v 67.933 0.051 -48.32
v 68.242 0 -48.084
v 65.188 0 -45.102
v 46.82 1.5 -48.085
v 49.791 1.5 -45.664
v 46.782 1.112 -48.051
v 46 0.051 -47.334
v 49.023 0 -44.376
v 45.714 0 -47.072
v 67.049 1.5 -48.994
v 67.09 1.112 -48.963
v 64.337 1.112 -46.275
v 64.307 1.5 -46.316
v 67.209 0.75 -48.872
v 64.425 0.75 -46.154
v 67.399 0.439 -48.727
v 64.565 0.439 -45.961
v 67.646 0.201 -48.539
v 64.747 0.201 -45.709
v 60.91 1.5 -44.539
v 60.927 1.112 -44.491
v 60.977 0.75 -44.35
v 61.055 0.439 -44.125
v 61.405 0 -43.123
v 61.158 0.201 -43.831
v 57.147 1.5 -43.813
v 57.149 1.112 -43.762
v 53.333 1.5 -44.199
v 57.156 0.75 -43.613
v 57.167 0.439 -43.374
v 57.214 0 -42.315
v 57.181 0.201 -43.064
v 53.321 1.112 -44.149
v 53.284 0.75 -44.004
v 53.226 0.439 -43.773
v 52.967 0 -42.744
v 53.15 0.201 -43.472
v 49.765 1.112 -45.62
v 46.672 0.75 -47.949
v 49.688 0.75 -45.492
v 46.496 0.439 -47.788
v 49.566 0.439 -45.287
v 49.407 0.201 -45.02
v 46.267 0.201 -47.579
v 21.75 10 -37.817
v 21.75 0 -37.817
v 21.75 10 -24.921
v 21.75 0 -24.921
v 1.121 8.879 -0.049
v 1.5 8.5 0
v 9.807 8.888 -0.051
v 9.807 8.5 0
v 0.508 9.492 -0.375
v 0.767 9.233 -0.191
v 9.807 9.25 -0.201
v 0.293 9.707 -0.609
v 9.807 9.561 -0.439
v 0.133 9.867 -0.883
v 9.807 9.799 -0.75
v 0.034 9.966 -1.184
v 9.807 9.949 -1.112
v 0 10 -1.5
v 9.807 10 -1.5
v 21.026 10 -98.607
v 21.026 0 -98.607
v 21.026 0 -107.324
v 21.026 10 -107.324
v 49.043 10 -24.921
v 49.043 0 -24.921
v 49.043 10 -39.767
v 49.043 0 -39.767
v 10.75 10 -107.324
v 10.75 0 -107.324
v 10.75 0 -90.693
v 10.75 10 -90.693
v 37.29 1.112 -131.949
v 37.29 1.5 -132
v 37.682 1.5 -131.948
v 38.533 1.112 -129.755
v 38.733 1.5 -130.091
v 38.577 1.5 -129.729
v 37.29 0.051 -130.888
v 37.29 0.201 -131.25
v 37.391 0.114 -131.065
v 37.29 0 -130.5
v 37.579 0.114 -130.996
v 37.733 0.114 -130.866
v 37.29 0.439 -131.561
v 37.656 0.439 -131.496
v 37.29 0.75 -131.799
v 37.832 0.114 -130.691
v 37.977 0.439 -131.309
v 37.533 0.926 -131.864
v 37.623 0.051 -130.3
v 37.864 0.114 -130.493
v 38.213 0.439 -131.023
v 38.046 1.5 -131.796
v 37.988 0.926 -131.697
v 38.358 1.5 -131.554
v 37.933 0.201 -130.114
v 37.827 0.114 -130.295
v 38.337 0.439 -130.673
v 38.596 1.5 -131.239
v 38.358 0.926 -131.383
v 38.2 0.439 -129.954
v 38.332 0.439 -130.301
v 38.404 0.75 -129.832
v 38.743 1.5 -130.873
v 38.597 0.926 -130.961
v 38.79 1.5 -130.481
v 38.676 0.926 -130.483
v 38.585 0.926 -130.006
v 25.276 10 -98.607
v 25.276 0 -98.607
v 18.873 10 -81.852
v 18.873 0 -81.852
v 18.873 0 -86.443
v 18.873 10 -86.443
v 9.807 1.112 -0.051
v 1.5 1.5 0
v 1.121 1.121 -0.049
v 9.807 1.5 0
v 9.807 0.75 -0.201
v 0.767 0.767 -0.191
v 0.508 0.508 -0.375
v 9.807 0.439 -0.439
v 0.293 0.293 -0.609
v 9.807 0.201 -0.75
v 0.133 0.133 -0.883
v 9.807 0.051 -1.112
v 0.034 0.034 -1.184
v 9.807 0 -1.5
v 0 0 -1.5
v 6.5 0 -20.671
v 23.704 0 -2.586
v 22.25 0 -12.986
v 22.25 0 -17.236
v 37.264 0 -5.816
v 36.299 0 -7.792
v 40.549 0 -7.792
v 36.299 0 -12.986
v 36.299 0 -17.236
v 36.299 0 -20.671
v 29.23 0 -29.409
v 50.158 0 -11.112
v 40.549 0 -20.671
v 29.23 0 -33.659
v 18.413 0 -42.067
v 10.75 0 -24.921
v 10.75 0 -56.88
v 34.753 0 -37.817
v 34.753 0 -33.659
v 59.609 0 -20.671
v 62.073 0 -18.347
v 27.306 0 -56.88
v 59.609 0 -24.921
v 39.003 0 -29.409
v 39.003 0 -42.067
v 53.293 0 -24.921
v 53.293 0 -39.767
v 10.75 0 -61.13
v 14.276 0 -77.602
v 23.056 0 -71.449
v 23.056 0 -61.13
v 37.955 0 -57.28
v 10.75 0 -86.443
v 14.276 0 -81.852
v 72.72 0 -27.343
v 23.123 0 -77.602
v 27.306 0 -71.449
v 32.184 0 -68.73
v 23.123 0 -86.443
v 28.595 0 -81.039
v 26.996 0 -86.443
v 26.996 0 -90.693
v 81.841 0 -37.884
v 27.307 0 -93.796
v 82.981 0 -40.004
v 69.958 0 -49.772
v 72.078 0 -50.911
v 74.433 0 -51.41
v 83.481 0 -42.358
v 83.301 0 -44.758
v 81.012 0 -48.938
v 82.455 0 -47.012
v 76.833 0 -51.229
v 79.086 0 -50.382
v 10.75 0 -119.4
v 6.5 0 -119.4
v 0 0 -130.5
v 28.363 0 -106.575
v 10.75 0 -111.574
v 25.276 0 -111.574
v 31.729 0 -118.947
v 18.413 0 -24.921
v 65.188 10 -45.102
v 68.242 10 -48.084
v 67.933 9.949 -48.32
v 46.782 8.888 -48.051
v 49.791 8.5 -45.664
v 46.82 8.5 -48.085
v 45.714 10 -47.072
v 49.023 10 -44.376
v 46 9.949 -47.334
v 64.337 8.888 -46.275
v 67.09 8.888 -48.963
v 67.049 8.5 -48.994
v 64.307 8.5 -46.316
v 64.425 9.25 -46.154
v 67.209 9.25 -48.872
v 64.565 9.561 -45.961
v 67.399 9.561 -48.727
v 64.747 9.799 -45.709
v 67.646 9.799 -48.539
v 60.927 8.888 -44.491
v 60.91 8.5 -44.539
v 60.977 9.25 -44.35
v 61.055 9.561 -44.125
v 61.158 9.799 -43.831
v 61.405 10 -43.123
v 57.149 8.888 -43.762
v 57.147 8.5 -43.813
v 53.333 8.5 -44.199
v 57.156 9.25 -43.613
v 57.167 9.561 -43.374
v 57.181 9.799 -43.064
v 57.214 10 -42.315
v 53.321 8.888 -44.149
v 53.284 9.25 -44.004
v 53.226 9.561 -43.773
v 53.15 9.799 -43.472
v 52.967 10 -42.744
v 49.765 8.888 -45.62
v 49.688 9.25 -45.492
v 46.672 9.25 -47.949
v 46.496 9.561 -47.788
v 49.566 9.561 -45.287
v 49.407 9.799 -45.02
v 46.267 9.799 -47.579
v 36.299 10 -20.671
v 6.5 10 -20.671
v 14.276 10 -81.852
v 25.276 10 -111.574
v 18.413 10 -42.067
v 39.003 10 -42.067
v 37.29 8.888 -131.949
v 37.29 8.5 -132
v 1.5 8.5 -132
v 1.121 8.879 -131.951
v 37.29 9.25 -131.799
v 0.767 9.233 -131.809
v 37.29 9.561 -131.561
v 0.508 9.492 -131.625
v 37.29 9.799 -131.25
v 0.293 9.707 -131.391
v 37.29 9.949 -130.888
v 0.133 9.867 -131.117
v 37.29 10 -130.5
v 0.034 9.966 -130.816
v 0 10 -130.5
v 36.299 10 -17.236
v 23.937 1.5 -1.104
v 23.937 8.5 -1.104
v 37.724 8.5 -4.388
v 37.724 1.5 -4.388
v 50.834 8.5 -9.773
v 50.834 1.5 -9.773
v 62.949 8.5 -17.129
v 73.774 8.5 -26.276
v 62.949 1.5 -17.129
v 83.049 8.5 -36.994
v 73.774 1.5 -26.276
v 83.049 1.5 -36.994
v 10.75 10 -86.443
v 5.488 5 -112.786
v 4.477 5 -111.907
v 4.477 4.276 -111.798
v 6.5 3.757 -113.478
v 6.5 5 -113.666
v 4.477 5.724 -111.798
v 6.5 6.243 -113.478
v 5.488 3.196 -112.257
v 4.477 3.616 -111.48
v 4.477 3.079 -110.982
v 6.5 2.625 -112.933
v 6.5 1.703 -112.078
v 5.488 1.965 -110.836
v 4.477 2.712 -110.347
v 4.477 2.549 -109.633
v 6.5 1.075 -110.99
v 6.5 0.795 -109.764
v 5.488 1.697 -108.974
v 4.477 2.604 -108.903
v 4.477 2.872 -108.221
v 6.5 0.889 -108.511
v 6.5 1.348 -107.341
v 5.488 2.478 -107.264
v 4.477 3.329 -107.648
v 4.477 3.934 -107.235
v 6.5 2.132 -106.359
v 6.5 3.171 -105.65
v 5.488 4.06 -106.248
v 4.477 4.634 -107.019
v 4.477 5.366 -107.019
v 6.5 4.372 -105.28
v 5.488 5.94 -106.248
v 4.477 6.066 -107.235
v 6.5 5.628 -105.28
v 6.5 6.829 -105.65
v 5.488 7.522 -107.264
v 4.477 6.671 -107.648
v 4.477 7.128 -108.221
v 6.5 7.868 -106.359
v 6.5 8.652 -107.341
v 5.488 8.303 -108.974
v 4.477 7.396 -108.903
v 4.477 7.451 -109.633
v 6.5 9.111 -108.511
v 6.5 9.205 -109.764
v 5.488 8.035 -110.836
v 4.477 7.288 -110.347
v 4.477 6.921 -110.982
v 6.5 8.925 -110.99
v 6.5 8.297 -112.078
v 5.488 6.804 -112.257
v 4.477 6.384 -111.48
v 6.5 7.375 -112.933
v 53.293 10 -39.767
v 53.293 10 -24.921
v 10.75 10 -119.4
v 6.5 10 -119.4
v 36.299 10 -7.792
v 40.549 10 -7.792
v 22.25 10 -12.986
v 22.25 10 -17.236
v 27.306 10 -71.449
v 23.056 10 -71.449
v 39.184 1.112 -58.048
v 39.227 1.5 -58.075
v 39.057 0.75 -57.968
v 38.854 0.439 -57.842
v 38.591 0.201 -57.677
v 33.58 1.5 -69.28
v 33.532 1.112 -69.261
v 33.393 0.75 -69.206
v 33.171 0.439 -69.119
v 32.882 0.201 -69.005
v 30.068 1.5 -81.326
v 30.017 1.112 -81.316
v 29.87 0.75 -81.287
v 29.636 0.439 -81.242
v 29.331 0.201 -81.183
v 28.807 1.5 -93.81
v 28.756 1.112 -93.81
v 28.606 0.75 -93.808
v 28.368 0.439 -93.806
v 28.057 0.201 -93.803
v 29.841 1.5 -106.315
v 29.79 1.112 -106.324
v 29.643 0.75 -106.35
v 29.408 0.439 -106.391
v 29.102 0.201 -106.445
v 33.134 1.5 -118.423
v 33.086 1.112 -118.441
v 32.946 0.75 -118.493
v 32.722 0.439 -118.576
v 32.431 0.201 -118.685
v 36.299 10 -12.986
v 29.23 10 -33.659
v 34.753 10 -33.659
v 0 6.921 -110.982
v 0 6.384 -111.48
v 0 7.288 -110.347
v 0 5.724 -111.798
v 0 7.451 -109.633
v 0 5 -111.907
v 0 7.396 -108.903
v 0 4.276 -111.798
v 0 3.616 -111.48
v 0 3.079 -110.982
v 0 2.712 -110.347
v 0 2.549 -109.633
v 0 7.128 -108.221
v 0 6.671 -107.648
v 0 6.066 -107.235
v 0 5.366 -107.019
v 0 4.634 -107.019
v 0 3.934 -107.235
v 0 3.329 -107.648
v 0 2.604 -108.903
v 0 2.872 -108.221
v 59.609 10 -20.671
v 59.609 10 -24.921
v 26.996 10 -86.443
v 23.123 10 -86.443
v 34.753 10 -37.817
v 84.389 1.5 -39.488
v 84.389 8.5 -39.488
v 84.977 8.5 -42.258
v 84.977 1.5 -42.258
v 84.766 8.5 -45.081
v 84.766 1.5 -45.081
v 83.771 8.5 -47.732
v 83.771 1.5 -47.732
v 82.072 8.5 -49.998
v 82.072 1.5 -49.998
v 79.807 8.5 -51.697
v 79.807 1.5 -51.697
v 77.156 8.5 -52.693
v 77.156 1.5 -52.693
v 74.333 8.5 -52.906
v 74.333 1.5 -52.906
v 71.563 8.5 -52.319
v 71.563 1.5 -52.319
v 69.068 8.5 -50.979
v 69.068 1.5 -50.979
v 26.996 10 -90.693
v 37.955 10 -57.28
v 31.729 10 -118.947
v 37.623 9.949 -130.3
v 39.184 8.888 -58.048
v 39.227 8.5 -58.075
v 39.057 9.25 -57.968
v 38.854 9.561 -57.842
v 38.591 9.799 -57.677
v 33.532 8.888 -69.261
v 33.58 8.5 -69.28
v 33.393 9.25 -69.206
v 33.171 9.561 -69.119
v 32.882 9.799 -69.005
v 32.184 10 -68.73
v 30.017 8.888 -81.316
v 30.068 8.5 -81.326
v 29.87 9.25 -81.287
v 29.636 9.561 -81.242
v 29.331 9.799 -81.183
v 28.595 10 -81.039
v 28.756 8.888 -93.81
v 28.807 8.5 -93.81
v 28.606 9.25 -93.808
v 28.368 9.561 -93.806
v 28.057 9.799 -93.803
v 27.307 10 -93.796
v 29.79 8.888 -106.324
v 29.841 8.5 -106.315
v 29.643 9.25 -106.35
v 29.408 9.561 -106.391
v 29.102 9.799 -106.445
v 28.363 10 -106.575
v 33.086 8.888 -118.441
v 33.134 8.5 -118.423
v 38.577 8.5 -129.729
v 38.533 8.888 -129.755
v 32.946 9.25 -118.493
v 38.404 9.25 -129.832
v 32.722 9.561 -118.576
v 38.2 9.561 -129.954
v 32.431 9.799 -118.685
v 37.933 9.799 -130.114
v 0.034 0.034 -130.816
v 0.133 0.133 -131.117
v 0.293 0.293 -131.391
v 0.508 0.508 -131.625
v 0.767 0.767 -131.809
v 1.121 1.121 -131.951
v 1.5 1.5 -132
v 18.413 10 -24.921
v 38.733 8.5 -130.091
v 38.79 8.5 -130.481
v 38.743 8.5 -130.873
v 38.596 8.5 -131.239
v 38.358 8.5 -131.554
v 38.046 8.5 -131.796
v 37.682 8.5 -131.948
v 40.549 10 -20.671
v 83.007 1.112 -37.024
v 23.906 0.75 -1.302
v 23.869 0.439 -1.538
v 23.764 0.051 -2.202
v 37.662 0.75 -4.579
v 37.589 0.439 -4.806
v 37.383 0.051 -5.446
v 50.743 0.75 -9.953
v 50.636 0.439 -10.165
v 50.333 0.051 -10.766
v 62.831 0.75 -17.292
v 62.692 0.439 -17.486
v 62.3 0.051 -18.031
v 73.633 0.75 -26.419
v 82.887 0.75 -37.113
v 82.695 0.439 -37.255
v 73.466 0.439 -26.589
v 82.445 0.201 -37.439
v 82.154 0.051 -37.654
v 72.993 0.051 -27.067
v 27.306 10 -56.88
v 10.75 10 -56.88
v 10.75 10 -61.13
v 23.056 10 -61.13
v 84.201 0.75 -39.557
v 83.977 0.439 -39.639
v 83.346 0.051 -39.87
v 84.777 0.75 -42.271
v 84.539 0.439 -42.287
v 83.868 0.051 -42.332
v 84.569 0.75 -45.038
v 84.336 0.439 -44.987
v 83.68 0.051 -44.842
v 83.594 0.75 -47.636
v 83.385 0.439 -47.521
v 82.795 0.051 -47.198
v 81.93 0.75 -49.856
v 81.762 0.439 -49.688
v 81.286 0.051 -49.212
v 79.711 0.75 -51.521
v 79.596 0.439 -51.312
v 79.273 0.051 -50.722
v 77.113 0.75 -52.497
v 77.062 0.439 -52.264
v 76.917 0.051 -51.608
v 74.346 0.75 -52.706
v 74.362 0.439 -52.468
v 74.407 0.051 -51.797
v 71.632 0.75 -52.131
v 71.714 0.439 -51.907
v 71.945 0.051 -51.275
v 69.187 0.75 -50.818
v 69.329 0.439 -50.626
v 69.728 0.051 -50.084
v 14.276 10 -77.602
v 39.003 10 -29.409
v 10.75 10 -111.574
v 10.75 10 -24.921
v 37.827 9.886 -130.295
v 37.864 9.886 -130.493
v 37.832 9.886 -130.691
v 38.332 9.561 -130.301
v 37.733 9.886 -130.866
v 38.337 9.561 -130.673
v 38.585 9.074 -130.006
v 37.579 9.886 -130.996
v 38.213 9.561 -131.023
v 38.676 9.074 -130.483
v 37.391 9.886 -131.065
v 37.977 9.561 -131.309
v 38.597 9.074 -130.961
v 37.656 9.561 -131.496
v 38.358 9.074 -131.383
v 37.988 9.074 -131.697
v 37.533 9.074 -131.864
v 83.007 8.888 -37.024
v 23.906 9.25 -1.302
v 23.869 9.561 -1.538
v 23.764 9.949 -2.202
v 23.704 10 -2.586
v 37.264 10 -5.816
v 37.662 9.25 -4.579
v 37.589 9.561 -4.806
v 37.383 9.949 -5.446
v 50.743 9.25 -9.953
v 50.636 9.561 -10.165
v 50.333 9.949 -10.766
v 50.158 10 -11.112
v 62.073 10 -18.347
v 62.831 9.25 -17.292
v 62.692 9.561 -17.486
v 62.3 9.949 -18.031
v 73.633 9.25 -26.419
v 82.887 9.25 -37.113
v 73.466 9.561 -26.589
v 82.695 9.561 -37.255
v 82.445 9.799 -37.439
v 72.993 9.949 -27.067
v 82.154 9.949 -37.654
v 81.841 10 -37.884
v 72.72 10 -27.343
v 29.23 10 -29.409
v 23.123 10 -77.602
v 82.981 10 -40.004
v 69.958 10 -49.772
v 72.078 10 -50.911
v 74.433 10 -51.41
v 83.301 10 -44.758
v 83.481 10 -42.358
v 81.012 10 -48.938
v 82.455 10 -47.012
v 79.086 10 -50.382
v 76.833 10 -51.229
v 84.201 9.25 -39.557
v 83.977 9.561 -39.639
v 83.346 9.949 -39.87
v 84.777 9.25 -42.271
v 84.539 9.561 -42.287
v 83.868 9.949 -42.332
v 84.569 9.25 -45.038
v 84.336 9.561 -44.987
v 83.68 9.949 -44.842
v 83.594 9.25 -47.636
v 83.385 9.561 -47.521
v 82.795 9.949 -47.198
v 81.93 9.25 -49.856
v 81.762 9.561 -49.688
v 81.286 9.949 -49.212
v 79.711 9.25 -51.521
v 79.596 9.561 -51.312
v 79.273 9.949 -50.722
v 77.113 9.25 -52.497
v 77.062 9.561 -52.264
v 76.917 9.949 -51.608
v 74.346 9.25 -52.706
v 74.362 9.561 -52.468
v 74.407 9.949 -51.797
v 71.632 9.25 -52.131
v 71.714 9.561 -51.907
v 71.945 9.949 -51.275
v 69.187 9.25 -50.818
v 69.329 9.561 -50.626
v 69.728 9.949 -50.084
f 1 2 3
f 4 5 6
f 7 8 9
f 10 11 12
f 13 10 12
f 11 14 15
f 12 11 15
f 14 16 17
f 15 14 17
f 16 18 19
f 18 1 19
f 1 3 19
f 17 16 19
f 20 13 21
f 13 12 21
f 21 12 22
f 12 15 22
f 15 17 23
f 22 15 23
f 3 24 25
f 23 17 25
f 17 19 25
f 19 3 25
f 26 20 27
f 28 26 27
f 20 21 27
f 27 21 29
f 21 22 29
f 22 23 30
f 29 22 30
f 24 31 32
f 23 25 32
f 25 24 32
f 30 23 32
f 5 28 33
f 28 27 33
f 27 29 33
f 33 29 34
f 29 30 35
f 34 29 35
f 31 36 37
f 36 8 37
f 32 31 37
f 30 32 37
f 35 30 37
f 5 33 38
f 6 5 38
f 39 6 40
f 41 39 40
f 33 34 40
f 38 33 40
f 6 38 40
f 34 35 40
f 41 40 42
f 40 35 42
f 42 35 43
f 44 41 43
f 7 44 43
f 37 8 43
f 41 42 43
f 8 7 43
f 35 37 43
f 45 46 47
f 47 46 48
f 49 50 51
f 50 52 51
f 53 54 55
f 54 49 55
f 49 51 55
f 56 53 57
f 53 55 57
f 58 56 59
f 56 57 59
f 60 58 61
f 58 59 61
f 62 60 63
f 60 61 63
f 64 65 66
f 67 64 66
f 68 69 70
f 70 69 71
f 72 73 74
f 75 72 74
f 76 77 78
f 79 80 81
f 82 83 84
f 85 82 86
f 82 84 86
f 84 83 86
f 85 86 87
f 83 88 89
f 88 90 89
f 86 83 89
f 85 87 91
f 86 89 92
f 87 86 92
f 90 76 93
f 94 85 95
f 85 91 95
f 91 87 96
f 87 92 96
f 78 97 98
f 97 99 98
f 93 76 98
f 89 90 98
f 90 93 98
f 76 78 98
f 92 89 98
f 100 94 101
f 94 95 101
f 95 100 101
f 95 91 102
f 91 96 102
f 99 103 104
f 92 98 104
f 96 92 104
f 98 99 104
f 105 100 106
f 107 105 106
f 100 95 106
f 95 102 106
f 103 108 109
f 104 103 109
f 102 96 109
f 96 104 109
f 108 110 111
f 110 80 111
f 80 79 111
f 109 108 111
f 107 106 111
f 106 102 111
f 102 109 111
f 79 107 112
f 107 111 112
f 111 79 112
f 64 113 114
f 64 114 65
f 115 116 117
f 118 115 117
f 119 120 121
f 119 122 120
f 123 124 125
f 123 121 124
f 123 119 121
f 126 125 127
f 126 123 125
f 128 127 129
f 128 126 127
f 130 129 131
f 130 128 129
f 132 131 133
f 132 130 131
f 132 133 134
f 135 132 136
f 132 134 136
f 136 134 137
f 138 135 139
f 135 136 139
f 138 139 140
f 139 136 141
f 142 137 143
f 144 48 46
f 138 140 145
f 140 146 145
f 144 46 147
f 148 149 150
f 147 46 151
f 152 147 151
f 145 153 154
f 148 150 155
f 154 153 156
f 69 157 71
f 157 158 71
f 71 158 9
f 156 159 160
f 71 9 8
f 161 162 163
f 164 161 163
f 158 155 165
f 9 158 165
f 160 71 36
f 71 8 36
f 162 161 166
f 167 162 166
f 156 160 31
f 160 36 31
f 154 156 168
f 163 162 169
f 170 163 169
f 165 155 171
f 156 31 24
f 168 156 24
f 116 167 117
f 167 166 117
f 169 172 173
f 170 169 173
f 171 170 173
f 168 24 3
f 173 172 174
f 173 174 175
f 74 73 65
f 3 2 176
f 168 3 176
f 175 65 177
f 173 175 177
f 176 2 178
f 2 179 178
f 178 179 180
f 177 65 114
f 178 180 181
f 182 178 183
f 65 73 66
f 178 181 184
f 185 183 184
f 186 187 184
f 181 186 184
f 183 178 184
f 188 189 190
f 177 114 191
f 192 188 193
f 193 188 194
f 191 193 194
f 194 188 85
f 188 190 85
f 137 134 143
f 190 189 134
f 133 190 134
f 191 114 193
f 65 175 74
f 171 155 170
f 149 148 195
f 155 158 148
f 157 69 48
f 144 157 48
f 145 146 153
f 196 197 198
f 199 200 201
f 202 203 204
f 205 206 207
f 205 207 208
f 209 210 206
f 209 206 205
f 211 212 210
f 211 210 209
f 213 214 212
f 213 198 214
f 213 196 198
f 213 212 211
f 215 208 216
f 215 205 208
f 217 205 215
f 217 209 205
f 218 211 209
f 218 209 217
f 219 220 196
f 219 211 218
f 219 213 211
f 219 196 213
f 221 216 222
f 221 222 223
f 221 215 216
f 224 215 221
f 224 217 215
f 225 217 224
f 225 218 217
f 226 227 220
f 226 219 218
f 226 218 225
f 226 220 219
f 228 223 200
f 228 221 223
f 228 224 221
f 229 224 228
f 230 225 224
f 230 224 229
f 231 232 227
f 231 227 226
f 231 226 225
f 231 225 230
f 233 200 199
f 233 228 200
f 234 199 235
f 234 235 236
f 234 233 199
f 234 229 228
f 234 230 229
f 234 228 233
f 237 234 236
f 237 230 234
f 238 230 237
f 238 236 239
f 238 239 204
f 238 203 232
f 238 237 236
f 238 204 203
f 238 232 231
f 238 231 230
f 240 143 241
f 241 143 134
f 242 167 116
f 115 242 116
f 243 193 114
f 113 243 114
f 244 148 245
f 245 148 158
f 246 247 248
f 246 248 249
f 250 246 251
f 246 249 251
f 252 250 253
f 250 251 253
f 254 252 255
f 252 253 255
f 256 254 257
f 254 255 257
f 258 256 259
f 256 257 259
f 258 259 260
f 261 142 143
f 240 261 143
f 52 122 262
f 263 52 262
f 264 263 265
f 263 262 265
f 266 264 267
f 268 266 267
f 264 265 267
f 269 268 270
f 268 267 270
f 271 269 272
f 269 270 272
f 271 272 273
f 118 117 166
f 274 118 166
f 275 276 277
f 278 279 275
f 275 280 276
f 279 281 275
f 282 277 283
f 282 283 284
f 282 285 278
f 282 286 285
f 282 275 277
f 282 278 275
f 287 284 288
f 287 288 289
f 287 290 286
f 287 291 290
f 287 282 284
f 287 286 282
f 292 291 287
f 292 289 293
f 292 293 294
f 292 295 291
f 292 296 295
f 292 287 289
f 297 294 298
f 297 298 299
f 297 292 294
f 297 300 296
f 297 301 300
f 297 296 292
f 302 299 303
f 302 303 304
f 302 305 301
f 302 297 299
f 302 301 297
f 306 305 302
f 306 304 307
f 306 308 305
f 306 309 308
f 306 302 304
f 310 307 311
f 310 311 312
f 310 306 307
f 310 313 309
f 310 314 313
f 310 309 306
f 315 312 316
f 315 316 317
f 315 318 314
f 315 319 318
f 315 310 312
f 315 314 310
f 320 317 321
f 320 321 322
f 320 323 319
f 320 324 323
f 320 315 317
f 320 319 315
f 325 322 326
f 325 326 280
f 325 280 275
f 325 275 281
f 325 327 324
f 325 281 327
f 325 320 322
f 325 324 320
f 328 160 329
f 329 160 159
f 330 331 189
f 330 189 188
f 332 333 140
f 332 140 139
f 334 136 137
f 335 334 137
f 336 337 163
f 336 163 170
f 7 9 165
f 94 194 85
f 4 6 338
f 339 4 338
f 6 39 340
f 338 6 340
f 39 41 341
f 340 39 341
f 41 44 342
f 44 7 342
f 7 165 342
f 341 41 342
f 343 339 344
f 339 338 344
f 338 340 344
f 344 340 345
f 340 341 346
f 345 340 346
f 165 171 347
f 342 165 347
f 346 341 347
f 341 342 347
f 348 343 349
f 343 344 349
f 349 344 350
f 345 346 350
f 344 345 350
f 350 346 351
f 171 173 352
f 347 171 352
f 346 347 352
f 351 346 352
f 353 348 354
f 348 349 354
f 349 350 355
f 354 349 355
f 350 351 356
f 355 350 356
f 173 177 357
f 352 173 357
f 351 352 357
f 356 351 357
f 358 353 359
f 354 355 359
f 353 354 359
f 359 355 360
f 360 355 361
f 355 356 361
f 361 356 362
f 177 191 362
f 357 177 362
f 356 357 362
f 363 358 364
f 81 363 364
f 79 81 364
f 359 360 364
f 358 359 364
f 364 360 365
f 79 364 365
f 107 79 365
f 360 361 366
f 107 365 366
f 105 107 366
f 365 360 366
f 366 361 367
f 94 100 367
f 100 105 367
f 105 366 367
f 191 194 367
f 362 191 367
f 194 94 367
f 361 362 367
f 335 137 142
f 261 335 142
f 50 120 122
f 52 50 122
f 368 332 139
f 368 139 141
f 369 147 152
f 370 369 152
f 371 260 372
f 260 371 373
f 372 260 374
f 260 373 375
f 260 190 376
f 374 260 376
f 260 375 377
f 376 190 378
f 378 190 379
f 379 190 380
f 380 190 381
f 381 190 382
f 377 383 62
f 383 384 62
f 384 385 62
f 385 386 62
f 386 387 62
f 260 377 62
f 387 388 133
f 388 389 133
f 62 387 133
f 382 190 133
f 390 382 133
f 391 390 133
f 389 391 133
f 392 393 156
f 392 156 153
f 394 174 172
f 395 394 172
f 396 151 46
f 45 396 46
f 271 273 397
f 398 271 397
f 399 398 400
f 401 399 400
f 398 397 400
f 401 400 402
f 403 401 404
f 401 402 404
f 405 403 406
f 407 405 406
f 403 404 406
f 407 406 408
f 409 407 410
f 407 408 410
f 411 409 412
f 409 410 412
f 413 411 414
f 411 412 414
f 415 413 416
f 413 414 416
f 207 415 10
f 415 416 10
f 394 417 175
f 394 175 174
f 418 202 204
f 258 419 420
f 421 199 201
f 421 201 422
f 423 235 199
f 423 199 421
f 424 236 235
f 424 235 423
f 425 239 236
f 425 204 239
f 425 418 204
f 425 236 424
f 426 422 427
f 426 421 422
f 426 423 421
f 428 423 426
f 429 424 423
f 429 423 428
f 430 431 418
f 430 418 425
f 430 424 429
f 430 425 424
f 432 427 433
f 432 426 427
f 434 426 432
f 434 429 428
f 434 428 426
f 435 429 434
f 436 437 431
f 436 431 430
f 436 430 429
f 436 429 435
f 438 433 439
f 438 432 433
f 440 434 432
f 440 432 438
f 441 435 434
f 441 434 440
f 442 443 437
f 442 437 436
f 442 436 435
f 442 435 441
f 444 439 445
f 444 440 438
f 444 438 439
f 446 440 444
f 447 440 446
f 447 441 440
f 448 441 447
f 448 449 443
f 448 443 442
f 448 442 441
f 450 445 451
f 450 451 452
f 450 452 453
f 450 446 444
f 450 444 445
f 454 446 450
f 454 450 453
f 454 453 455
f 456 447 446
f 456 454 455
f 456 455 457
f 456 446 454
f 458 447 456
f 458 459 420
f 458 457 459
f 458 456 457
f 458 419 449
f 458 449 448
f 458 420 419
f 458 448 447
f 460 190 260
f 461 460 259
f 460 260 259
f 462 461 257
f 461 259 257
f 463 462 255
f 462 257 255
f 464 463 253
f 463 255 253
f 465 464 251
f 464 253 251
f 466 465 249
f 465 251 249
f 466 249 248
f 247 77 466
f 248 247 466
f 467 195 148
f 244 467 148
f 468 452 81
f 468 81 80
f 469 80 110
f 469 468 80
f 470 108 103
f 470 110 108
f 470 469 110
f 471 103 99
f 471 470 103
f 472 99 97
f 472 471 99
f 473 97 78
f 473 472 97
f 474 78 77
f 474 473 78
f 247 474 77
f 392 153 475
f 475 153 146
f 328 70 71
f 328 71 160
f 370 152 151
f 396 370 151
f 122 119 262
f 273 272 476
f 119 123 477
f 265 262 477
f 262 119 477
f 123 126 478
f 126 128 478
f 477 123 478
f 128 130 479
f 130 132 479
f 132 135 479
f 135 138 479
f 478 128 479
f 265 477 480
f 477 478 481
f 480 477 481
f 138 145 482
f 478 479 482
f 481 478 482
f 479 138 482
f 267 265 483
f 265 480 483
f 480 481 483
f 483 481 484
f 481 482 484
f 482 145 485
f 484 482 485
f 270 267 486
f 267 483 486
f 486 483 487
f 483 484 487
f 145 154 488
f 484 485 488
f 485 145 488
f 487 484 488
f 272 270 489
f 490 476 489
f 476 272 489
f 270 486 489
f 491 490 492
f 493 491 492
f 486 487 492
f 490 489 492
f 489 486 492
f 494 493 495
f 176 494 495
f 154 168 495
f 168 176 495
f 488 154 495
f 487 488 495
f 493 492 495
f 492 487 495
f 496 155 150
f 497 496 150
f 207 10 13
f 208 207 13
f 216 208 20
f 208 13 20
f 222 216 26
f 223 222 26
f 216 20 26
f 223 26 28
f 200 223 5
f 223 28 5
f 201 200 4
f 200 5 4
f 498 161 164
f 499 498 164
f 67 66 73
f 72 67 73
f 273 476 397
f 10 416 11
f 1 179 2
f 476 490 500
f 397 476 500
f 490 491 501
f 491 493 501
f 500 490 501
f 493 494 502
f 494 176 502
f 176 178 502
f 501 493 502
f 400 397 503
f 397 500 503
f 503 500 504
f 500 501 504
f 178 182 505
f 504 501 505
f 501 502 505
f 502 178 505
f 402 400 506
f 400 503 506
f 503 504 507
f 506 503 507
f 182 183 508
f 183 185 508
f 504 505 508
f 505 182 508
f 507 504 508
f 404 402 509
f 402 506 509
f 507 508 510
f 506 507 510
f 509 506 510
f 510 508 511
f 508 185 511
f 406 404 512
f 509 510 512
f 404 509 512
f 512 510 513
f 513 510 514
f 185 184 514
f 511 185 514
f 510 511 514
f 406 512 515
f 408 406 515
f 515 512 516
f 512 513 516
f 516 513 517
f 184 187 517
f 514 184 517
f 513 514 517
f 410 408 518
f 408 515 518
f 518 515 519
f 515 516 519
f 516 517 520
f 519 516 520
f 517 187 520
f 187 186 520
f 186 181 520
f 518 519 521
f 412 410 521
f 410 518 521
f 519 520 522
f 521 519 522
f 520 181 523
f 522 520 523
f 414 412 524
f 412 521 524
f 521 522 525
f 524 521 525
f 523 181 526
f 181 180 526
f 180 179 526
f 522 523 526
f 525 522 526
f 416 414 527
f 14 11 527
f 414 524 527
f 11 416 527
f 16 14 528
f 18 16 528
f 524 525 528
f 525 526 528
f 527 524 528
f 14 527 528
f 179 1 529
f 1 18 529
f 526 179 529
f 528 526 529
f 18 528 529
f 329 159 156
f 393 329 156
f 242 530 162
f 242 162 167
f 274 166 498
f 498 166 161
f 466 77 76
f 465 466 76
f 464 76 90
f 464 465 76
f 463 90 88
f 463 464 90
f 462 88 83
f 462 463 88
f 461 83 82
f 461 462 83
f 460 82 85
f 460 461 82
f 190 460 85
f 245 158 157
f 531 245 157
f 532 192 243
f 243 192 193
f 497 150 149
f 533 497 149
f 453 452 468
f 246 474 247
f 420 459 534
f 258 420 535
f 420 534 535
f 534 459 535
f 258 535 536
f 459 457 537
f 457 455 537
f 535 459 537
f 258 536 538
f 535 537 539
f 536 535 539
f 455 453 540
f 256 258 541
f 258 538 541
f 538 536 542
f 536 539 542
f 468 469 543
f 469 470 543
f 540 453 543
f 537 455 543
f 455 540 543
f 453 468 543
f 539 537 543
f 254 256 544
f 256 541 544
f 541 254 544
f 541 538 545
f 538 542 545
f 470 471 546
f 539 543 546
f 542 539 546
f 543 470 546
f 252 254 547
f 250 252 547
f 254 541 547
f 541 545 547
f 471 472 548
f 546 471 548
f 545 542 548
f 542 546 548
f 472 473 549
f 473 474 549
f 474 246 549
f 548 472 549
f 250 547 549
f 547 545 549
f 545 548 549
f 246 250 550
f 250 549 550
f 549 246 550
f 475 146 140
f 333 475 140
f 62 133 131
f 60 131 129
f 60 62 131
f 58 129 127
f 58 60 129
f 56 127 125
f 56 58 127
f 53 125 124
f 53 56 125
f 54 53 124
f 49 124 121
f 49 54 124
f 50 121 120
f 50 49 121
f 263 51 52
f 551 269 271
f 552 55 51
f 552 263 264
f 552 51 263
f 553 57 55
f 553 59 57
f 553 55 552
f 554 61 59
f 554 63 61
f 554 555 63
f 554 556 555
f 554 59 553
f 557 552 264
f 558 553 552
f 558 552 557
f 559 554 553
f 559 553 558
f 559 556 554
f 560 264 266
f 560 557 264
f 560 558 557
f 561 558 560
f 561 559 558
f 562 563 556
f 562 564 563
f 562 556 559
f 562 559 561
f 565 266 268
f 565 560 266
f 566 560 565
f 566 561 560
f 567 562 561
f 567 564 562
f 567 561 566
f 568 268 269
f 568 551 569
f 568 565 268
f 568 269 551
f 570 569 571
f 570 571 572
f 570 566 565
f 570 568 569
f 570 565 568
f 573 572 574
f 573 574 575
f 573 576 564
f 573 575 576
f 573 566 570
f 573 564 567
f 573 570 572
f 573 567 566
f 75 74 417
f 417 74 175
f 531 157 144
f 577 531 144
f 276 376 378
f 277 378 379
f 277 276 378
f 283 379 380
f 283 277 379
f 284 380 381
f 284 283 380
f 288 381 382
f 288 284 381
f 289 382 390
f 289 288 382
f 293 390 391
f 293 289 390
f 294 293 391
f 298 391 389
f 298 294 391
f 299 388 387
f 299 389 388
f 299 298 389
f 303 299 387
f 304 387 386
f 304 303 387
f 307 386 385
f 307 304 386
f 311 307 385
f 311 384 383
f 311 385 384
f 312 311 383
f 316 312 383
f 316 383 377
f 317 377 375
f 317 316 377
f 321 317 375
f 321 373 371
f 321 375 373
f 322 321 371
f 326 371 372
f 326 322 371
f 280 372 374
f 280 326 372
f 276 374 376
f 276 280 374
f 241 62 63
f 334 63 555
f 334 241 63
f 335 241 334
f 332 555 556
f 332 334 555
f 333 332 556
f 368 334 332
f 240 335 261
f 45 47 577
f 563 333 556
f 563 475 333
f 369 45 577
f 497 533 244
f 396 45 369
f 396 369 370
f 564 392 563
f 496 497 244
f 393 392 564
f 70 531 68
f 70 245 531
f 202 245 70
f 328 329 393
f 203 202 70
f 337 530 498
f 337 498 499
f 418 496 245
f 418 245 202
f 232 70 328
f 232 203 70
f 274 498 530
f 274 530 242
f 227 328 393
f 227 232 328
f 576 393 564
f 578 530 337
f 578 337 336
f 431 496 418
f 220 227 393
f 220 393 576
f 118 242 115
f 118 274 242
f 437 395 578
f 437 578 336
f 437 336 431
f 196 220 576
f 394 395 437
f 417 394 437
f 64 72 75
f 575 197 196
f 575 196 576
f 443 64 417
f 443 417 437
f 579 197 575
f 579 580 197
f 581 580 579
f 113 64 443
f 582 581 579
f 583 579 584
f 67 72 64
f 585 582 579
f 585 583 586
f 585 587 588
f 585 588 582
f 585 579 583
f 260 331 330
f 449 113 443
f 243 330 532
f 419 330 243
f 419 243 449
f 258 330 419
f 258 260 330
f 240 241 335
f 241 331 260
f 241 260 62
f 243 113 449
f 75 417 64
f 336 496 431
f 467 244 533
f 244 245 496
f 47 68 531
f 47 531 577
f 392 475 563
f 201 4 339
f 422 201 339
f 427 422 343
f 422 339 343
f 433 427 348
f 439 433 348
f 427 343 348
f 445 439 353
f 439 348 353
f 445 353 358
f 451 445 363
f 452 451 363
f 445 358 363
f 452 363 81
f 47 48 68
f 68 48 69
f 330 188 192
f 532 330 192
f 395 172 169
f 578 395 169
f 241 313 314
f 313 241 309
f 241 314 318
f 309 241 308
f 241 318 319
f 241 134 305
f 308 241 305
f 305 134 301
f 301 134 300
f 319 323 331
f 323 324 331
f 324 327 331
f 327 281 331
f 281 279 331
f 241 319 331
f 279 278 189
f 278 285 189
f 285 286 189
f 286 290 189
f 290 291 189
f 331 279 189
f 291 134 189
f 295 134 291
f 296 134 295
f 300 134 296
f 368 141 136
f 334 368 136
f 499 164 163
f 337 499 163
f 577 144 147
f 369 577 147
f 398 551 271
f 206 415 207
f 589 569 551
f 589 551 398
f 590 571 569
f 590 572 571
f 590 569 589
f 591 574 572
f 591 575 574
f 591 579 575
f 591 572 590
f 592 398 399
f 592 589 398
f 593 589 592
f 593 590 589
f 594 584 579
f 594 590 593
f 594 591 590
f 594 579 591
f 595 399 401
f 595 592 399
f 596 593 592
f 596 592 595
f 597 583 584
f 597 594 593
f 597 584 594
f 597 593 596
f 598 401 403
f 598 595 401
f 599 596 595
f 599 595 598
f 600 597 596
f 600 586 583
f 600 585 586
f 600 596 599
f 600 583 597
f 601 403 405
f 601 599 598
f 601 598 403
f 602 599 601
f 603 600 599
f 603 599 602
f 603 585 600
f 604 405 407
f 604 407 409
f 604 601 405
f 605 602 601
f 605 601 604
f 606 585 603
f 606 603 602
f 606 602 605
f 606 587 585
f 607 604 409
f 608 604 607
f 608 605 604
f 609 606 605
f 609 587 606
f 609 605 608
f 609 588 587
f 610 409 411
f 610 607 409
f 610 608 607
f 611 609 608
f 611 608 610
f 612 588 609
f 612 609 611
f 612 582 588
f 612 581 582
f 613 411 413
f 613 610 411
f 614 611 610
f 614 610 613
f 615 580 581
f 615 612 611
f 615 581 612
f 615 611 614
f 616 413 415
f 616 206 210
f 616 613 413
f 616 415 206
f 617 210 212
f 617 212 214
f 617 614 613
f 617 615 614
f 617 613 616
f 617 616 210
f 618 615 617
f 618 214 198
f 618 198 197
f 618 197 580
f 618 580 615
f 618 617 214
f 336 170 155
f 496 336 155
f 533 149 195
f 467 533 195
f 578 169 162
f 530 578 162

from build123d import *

# Parameters (mm, degrees)
BOSS_EXTRUDE1_DEPTH = 10
FILLET1_R           = 1.5


with BuildPart() as part:
    # Sketch1 → Boss-Extrude1 (new body)
    with BuildSketch(Plane(origin=(0, 0, 0), x_dir=(1, 0, 0), z_dir=(0, 1, 0))):
        with BuildLine():
            Line((0, 132), (0, 0))
            Line((0, 0), (9.806899205, 0))
            ThreePointArc((9.806899205, 0), (50.833969992, 9.773283566), (83.048530962, 36.993857965))
            ThreePointArc((83.048530962, 36.993857965), (81.000199646, 50.92844911), (67.049362803, 48.993857965))
            ThreePointArc((67.049362803, 48.993857965), (57.146860922, 43.813297067), (46.819761712, 48.085155754))
            ThreePointArc((46.819761712, 48.085155754), (29.029737588, 88.873903236), (40, 132))
            Line((40, 132), (0, 132))
        make_face()
        Polygon((6.5, 20.67103065), (6.5, 119.400046722), (10.75, 119.400046722), (10.75, 111.574341839), (25.276432371, 111.574341839), (25.276432371, 107.324341839), (25.276432371, 98.607245151), (21.026432371, 98.607245151), (21.026432371, 107.324341839), (10.75, 107.324341839), (10.75, 90.692748994), (26.995661983, 90.692748994), (26.995661983, 86.442748994), (23.122830992, 86.442748994), (23.122830992, 77.602272136), (18.872830992, 77.602272136), (14.275783025, 77.602272136), (14.275783025, 81.852272136), (18.872830992, 81.852272136), (18.872830992, 86.442748994), (10.75, 86.442748994), (10.75, 61.130194379), (23.055943787, 61.130194379), (23.055943787, 71.449300242), (27.305943787, 71.449300242), (27.305943787, 61.130194379), (27.305943787, 56.880194379), (10.75, 56.880194379), (10.75, 24.92103065), (18.412851079, 24.92103065), (18.412851079, 42.066790132), (21.749945206, 42.066790132), (39.003105081, 42.066790132), (39.003105081, 37.816790132), (39.003105081, 29.408846891), (34.753105081, 29.408846891), (29.22963894, 29.408846891), (29.22963894, 33.658846891), (34.753105081, 33.658846891), (34.753105081, 37.816790132), (21.749945206, 37.816790132), (21.749945206, 24.92103065), (49.043283634, 24.92103065), (49.043283634, 39.766503131), (53.293283634, 39.766503131), (53.293283634, 24.92103065), (59.608702719, 24.92103065), (59.608702719, 20.67103065), (40.548717705, 20.67103065), (40.548717705, 7.79221883), (36.298717705, 7.79221883), (36.298717705, 12.986428014), (22.249875285, 12.986428014), (22.249875285, 17.236428014), (36.298717705, 17.236428014), (36.298717705, 20.67103065), (10.75, 20.67103065), align=None, mode=Mode.SUBTRACT)
    extrude(amount=BOSS_EXTRUDE1_DEPTH)

    # Fillet1
    fillet1_edges = [part.edges().sort_by_distance(p)[0] for p in [
        (0, 5, 0),
        (0, 5, -132),
        (40, 5, -132),
        (4.903449602, 10, 0),
        (50.833969992, 10, -9.773283566),
        (81.000199646, 10, -50.92844911),
        (57.146860922, 10, -43.813297067),
        (29.029737588, 10, -88.873903236),
        (20, 10, -132),
        (20, 0, -132),
        (29.029737588, 0, -88.873903236),
        (57.146860922, 0, -43.813297067),
        (81.000199646, 0, -50.92844911),
        (50.833969992, 0, -9.773283566),
        (4.903449602, 0, 0),
    ]]
    fillet(fillet1_edges, radius=FILLET1_R)

    # Sketch5 → CSK for #8 Flat Head Machine Screw2 (revolve, cut)
    with BuildSketch(Plane(origin=(6.5, 5, -109.449341839), x_dir=(0, 0, -1), z_dir=(0, 1, 0))):
        Polygon((0, 0), (0, 11.476584928), (2.45745, 10), (2.45745, 2.02344051), (4.2164, 0), align=None)
    revolve(axis=Axis((12.85, 5, -109.449341839), (-1, 0, 0)), mode=Mode.SUBTRACT)


solid = part.part
